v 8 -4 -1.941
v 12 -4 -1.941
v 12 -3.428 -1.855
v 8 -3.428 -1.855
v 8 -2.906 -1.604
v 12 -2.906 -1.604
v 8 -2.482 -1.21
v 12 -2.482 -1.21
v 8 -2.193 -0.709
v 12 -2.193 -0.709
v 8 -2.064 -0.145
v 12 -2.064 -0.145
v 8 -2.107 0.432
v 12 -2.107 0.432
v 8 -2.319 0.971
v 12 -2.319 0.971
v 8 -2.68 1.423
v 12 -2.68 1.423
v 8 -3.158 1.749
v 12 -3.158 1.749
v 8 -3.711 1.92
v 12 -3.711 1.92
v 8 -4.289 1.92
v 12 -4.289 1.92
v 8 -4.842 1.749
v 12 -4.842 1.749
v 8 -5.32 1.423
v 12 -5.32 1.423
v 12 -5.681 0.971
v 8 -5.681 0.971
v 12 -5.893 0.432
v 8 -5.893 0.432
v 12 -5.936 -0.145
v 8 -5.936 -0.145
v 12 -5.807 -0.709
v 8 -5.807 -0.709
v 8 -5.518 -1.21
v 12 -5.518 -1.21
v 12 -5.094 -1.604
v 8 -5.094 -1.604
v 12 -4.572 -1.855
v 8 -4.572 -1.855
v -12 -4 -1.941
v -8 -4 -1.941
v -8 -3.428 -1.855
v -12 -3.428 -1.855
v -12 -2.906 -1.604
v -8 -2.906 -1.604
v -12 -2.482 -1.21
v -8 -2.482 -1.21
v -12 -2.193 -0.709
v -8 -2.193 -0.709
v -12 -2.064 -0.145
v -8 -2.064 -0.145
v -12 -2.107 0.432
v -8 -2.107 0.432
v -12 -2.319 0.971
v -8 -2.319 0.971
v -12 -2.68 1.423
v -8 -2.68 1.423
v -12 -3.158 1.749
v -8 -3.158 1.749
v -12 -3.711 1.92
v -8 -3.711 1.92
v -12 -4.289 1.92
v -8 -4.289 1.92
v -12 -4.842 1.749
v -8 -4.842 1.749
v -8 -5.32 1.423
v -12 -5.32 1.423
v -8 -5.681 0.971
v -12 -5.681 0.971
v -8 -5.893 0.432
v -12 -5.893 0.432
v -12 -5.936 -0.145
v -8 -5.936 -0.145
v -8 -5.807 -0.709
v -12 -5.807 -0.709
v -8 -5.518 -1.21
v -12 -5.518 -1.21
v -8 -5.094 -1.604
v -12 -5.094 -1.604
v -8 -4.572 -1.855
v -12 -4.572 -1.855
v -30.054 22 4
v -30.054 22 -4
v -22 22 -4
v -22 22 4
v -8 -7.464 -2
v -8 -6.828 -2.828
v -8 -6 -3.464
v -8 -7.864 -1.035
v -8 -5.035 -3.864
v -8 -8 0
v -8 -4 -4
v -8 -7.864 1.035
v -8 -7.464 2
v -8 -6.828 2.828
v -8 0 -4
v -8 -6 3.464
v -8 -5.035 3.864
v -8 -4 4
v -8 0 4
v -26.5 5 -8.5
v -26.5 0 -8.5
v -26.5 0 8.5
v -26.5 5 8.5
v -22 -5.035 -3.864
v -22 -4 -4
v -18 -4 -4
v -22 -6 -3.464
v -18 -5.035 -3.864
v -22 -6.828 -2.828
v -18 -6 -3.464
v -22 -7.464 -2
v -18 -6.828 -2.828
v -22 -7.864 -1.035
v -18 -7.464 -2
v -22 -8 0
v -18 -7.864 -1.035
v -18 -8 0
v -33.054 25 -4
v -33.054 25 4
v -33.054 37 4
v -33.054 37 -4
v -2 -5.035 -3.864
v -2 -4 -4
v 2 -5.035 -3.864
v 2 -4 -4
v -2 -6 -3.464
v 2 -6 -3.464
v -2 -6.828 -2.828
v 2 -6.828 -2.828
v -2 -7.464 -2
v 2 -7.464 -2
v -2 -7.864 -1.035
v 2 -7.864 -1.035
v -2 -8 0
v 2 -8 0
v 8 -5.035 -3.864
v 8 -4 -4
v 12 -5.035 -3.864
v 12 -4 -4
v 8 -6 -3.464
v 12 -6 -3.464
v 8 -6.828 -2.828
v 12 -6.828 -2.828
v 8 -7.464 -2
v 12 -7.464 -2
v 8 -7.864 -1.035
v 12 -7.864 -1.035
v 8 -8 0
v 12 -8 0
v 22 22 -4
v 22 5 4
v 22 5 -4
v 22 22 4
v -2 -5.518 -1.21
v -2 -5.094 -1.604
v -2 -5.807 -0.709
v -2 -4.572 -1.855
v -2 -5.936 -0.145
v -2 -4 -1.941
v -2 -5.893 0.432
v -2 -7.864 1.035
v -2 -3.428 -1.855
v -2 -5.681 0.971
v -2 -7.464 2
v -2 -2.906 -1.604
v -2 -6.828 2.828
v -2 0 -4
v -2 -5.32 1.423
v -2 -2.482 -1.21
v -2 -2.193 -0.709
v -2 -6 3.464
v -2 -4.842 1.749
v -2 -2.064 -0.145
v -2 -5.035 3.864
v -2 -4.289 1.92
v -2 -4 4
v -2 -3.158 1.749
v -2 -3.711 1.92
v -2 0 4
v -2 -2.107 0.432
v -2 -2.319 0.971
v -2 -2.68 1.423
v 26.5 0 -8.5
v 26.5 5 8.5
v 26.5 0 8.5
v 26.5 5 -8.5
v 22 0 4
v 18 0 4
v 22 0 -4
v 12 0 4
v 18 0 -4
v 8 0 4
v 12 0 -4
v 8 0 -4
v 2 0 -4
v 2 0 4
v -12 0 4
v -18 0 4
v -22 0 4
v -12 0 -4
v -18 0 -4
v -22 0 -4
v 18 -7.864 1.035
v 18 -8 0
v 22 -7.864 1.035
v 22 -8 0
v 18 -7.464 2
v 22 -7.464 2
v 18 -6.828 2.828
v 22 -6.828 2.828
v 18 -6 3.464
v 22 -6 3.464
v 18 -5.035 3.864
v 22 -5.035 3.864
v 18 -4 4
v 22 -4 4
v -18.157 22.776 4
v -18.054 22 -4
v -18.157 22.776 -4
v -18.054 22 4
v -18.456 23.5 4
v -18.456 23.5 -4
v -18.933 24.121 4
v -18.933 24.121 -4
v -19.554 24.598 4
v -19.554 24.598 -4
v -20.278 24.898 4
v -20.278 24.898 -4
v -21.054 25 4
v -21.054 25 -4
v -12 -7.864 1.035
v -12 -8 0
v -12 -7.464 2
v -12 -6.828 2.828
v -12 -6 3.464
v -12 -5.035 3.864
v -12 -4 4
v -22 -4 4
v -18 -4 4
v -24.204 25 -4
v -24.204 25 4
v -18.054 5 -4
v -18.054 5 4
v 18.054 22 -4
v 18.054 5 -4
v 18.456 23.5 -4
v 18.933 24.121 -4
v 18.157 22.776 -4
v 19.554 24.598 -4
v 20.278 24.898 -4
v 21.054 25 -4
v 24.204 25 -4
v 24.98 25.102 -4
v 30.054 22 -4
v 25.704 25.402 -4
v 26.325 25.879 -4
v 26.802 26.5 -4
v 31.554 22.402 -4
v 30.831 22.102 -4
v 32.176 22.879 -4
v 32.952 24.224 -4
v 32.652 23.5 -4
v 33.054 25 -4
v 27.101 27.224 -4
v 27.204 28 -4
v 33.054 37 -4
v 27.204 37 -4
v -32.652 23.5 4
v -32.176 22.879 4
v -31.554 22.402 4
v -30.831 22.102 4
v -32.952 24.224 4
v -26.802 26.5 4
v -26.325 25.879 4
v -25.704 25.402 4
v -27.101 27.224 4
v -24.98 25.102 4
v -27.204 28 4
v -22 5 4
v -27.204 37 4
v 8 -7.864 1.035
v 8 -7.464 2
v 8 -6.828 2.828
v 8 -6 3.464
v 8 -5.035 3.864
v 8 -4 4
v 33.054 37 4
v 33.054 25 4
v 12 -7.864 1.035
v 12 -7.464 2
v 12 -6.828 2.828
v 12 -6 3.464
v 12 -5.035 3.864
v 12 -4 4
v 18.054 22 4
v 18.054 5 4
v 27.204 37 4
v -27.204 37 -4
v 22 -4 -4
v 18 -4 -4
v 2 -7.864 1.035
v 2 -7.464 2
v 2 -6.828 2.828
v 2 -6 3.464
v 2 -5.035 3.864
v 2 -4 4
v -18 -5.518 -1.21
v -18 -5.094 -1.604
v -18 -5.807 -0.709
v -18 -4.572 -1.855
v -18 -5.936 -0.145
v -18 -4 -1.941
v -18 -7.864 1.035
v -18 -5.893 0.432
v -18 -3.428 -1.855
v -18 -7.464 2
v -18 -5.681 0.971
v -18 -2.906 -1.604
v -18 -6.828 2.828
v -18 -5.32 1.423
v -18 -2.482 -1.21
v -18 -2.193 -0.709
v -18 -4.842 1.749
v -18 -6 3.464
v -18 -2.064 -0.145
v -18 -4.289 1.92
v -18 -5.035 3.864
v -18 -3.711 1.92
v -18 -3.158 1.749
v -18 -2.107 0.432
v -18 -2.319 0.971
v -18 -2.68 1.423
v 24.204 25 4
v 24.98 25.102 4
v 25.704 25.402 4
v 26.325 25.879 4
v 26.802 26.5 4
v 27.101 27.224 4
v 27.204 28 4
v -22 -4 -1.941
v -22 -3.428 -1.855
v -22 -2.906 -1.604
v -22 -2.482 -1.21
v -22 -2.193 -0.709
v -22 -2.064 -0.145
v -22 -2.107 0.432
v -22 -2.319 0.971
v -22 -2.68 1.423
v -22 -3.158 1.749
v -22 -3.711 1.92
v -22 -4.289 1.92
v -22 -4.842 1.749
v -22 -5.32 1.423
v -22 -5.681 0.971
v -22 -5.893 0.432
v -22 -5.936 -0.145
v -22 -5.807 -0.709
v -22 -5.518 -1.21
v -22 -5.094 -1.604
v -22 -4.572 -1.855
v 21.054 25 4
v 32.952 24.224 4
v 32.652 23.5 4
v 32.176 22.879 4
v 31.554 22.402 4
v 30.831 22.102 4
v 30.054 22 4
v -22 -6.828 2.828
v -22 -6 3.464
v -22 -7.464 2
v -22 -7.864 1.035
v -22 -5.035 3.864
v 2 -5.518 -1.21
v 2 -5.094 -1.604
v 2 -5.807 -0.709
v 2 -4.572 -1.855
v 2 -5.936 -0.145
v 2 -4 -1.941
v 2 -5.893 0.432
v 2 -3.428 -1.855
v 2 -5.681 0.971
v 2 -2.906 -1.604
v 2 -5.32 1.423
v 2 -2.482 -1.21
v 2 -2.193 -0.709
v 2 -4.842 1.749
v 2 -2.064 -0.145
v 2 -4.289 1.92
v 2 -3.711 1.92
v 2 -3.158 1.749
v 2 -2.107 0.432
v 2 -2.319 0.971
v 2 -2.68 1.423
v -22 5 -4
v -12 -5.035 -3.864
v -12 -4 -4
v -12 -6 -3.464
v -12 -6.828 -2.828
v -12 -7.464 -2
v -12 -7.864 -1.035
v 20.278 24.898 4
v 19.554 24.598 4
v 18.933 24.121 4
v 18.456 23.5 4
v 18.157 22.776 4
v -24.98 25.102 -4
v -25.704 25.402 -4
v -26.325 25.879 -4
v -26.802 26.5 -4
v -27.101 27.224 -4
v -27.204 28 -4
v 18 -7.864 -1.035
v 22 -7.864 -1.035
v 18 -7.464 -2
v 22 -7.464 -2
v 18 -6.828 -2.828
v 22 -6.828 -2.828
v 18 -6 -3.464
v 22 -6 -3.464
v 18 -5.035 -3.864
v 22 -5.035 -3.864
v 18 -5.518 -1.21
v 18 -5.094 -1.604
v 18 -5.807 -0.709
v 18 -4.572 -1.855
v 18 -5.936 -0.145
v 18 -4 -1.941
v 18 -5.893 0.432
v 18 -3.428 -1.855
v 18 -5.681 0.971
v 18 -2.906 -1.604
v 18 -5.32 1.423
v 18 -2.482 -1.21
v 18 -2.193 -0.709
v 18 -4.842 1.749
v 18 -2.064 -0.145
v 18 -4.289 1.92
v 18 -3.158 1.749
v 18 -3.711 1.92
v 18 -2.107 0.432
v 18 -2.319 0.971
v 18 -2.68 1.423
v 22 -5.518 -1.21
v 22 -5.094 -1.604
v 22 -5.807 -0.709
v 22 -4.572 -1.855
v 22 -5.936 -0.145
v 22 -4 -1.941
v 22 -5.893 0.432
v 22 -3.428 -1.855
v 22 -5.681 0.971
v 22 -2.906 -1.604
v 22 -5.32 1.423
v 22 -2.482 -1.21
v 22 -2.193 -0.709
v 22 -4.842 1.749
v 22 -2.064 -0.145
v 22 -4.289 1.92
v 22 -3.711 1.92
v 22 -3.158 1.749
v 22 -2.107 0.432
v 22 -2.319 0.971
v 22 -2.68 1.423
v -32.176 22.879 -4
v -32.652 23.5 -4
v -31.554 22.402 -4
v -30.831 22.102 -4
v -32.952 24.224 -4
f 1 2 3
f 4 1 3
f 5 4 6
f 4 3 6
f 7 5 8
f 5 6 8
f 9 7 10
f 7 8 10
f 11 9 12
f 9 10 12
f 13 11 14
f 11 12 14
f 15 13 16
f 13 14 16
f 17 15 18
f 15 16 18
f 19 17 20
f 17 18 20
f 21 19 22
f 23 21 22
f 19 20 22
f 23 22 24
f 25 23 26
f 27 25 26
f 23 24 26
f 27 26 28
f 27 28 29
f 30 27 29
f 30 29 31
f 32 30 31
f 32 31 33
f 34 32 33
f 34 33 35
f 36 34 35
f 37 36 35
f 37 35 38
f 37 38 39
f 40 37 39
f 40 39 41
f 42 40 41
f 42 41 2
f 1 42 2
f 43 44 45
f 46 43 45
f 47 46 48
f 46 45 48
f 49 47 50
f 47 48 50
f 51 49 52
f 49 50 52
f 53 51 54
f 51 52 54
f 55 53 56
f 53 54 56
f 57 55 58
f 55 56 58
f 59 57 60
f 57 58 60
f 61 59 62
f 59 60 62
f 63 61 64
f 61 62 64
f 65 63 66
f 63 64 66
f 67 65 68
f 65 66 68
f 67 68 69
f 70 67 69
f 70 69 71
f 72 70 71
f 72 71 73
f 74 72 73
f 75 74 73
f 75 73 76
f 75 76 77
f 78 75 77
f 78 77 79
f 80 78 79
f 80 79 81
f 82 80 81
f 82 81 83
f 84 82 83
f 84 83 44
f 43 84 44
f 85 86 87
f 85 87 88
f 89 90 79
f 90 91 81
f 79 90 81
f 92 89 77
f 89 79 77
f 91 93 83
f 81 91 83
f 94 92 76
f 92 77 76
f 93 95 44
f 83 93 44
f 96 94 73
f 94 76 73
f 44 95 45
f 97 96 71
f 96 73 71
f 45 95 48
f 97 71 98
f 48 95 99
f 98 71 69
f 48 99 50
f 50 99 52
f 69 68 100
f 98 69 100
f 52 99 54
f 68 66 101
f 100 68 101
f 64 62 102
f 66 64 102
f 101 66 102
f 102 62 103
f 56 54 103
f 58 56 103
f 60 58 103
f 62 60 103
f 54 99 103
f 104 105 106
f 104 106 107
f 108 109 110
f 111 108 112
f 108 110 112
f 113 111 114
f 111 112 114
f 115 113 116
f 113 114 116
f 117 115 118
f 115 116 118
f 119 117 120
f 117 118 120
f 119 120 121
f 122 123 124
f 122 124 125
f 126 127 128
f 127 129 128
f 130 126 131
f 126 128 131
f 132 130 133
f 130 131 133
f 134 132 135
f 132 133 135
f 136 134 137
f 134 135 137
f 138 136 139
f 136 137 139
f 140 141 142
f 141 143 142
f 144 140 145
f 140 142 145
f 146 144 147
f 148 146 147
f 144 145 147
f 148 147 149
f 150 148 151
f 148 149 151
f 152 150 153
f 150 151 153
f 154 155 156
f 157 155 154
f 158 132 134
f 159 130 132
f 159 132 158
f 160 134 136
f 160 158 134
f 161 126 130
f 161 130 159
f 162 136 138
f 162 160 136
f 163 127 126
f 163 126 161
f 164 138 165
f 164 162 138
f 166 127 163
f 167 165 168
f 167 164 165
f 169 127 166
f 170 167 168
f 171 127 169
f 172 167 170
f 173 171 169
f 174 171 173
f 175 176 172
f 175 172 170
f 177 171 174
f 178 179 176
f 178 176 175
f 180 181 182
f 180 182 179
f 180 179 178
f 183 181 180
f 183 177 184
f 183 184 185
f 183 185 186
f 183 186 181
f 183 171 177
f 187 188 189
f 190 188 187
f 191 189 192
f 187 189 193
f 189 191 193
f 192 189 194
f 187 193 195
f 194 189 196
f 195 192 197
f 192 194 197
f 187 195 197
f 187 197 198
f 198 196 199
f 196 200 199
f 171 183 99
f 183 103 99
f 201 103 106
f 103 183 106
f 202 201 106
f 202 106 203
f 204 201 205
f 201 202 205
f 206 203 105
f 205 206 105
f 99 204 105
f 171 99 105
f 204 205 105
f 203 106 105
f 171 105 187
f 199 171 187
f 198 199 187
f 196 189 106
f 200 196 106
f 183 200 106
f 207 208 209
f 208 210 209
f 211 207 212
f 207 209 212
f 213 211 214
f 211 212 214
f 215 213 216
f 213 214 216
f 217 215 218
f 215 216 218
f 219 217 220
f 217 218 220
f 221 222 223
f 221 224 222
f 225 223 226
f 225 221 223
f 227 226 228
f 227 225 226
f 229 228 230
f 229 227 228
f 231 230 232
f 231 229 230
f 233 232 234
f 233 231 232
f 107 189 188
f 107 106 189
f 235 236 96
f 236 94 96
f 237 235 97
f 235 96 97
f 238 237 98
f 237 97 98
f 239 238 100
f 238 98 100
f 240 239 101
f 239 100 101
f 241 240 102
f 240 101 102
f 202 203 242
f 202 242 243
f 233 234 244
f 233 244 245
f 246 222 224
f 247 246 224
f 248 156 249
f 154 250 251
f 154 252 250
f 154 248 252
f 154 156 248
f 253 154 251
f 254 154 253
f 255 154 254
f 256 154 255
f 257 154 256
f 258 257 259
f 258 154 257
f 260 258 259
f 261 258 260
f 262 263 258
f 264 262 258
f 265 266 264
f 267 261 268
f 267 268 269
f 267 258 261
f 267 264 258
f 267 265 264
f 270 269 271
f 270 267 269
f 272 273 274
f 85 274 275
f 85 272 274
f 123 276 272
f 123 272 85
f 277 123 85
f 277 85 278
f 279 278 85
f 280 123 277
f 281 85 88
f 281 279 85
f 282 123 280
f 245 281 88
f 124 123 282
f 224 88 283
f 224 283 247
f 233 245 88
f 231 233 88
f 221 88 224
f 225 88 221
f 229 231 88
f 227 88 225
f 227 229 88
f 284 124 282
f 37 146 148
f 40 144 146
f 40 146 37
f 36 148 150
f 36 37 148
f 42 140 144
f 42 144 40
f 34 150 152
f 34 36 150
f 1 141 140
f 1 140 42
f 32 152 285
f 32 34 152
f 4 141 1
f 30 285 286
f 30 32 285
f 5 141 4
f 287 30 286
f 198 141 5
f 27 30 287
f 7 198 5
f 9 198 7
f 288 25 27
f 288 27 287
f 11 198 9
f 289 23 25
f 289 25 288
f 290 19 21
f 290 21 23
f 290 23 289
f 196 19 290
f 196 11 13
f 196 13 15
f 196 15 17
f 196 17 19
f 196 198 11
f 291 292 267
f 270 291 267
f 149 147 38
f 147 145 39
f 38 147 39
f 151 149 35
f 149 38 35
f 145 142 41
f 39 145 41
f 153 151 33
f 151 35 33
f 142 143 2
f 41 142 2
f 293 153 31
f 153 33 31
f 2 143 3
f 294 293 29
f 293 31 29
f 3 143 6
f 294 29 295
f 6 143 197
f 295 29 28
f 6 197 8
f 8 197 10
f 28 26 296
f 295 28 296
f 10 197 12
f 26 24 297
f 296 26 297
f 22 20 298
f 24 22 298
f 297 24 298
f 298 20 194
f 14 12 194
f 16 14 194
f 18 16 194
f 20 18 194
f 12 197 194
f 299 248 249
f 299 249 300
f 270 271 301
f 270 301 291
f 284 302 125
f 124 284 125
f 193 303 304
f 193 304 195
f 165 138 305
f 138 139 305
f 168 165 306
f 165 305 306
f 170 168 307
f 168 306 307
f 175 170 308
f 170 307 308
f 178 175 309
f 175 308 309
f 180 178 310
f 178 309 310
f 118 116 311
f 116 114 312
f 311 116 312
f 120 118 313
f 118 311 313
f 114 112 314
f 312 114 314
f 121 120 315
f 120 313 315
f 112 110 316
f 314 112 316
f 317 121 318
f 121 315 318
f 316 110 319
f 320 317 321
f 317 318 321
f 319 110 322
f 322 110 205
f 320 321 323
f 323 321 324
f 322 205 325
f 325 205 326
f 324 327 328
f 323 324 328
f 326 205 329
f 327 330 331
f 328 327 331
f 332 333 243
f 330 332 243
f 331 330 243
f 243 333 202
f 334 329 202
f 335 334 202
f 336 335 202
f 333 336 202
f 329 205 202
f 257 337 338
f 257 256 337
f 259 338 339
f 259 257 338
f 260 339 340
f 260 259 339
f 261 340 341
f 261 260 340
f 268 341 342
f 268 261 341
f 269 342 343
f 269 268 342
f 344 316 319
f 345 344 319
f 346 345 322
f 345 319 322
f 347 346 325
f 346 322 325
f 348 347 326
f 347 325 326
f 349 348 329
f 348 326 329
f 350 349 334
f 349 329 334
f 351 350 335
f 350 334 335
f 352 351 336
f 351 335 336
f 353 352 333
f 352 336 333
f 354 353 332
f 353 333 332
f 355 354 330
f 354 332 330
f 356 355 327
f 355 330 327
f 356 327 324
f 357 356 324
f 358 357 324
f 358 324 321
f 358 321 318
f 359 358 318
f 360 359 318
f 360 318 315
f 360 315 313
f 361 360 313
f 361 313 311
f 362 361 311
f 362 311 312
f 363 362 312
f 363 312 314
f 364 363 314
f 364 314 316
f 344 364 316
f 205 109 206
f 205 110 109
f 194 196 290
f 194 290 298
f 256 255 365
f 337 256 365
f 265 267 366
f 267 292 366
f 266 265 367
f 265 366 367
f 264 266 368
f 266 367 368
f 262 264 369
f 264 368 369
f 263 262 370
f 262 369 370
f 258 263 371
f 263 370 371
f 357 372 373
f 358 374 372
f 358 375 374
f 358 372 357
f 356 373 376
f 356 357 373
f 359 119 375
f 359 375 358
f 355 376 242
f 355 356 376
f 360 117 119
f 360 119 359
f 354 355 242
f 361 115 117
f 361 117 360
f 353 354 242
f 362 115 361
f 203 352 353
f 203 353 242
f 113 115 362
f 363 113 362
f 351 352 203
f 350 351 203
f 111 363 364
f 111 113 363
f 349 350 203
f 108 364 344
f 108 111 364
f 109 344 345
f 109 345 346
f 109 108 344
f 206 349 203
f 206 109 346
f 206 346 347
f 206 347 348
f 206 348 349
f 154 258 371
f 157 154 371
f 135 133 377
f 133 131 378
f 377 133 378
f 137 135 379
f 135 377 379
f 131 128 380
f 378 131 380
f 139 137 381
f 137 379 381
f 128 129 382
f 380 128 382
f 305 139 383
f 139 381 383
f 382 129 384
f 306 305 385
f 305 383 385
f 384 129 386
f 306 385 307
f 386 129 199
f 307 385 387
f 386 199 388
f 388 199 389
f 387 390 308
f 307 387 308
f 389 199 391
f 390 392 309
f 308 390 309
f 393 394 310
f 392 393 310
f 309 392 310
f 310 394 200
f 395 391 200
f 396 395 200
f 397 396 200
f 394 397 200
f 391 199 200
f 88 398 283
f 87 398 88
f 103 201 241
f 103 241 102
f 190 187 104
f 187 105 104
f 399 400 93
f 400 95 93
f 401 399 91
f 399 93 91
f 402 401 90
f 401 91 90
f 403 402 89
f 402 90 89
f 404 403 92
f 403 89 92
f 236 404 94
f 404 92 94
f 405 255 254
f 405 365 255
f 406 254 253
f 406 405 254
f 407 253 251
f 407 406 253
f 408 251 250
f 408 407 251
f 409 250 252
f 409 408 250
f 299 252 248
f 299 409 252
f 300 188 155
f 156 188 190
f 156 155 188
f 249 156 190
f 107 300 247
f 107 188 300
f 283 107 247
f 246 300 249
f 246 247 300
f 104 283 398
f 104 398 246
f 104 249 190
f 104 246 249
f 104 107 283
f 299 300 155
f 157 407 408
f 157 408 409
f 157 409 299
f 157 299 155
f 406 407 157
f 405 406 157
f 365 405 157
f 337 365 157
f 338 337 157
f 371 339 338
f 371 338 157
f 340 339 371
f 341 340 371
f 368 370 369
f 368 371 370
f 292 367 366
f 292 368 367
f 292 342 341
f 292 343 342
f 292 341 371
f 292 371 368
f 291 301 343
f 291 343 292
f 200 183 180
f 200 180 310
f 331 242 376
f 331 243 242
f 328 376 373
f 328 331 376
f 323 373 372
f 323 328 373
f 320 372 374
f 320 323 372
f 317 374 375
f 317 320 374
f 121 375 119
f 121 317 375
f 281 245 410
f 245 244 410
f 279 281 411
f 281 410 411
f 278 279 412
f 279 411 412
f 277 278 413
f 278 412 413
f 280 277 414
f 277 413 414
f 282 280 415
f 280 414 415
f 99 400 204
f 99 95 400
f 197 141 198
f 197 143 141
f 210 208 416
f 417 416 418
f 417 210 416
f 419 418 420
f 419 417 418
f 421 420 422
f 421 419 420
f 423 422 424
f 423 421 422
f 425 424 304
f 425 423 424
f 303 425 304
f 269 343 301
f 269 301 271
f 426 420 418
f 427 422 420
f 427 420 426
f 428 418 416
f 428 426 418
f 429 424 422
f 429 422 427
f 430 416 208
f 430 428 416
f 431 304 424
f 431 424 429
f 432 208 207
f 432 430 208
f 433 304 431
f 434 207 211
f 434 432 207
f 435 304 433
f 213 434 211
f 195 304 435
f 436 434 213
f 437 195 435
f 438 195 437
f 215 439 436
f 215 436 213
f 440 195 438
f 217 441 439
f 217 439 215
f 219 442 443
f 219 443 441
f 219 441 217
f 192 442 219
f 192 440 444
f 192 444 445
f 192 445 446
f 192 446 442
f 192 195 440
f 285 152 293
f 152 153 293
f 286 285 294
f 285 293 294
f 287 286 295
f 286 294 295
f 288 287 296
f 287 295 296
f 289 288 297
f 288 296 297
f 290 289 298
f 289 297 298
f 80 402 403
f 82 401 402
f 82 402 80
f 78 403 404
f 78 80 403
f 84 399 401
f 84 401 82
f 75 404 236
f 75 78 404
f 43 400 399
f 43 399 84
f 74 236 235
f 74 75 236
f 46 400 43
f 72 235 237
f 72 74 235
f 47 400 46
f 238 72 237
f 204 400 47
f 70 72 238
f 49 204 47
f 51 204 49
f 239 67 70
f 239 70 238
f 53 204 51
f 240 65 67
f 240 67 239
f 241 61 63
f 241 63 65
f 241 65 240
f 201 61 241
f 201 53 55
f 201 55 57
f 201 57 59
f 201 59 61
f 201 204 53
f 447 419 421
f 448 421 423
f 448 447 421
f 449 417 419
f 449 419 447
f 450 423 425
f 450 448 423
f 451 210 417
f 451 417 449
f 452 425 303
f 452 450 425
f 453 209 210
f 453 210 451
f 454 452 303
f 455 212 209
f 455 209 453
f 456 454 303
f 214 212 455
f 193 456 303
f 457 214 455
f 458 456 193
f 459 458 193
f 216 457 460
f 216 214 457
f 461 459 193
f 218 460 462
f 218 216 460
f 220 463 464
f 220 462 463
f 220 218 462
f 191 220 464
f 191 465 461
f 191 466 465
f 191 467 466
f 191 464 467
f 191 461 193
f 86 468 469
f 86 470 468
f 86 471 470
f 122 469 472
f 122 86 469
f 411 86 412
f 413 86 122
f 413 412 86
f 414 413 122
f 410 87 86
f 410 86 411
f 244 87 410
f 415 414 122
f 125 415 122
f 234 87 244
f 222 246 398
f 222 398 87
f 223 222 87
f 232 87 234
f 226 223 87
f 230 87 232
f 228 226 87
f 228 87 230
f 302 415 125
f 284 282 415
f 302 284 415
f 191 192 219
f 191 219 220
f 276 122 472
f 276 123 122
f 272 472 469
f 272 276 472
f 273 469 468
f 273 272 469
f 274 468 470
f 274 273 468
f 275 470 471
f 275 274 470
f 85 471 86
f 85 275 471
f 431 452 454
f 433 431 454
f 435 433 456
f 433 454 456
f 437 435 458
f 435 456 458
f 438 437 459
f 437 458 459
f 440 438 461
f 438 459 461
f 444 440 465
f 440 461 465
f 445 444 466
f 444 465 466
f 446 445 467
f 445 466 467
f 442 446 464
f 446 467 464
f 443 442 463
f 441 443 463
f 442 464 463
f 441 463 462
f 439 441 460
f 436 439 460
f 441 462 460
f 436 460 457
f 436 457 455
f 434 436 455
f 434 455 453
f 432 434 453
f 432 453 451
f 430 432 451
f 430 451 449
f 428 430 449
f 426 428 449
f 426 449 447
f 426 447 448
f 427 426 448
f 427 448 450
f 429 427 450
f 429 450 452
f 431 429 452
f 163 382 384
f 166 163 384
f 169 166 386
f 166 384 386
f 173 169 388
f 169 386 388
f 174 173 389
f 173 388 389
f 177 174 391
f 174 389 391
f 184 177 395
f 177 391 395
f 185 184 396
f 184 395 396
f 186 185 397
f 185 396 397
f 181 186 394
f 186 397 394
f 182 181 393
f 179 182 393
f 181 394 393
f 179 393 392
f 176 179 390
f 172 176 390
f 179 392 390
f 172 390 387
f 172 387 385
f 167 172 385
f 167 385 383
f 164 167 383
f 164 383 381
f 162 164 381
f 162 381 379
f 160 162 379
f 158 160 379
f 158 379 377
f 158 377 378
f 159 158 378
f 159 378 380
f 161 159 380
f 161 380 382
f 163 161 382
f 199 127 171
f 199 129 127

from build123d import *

# Parameters (mm, degrees)
SKETCH1_W              = 44
SKETCH1_H              = 8
BOSS_EXTRUDE1_DEPTH    = 5
SKETCH2_W              = 3.945665761
SKETCH2_H              = 8
BOSS_EXTRUDE2_DEPTH    = 17
SKETCH3_W              = 8
SKETCH3_H              = 3
BOSS_EXTRUDE3_DEPTH    = 15
SKETCH4_W              = 5.850643969
SKETCH4_H              = 8
BOSS_EXTRUDE4_DEPTH    = 12
SKETCH5_W              = 4
SKETCH5_H              = 8
BOSS_EXTRUDE5_DEPTH    = 8
FILLET2_R              = 4
LPATTERN1_COUNT        = 5
LPATTERN1_PITCH        = 10
FILLET2_OF_LPATTERN1_R = 4
SKETCH6_R              = 1.941337646
CUT_EXTRUDE1_DEPTH     = 67.452838302
SKETCH7_W              = 44
SKETCH7_H              = 5
BOSS_EXTRUDE6_DEPTH    = 4.5
SKETCH8_W              = 12.5
SKETCH8_H              = 5
BOSS_EXTRUDE7_DEPTH    = 4.5
SKETCH9_W              = 48.5
SKETCH9_H              = 5
BOSS_EXTRUDE8_DEPTH    = 4.5
SKETCH10_W             = 17
SKETCH10_H             = 5
BOSS_EXTRUDE9_DEPTH    = 4.5
FILLET4_R              = 3


with BuildPart() as part:
    # Sketch1 → Boss-Extrude1 (new body)
    with BuildSketch(Plane(origin=(0, 0, 0), x_dir=(1, 0, 0), z_dir=(0, 1, 0))):
        Rectangle(SKETCH1_W, SKETCH1_H)
    extrude(amount=BOSS_EXTRUDE1_DEPTH)

    # Sketch2 → Boss-Extrude2 (add)
    with BuildSketch(Plane(origin=(0, 5, 0), x_dir=(1, 0, 0), z_dir=(0, 1, 0))):
        with Locations((20.027167119, 0)):
            Rectangle(SKETCH2_W, SKETCH2_H)
    boss_extrude2 = extrude(amount=BOSS_EXTRUDE2_DEPTH)

    # Sketch3 → Boss-Extrude3 (add)
    with BuildSketch(Plane.ZY.offset(-18.054334239)):
        with Locations((0, 23.5)):
            Rectangle(SKETCH3_W, SKETCH3_H)
    boss_extrude3 = extrude(amount=-BOSS_EXTRUDE3_DEPTH)

    # Sketch4 → Boss-Extrude4 (add)
    with BuildSketch(Plane(origin=(0, 25, 0), x_dir=(1, 0, 0), z_dir=(0, 1, 0))):
        with Locations((30.129012255, 0)):
            Rectangle(SKETCH4_W, SKETCH4_H)
    boss_extrude4 = extrude(amount=BOSS_EXTRUDE4_DEPTH)

    # Mirror1: Boss-Extrude2, Boss-Extrude3, Boss-Extrude4 across plane
    add(boss_extrude2.mirror(Plane(origin=(0, 0, 0), x_dir=(0, 0, 1), z_dir=(1, 0, 0))))
    add(boss_extrude3.mirror(Plane(origin=(0, 0, 0), x_dir=(0, 0, 1), z_dir=(1, 0, 0))))
    add(boss_extrude4.mirror(Plane(origin=(0, 0, 0), x_dir=(0, 0, 1), z_dir=(1, 0, 0))))

    # Sketch5 → Boss-Extrude5 (add)
    with BuildSketch(Plane.XZ):
        with Locations((20, 0)):
            Rectangle(SKETCH5_W, SKETCH5_H)
    boss_extrude5 = extrude(amount=BOSS_EXTRUDE5_DEPTH)

    # Fillet2
    fillet2_edges = [part.edges().sort_by_distance(p)[0] for p in [
        (20, -8, -4),
        (20, -8, 4),
    ]]
    fillet(fillet2_edges, radius=FILLET2_R - 0.0001)  # a hair under: the kernel refuses the full size

    # LPattern1: Boss-Extrude5 ×5
    with Locations(*[(-i * LPATTERN1_PITCH, 0, 0) for i in range(1, LPATTERN1_COUNT)]):
        add(boss_extrude5)

    # Fillet2 of LPattern1
    fillet2_of_lpattern1_edges = [part.edges().sort_by_distance(p)[0] for p in [
        (10, -8, -4),
        (10, -8, 4),
        (0, -8, -4),
        (0, -8, 4),
        (-10, -8, -4),
        (-10, -8, 4),
        (-20, -8, -4),
        (-20, -8, 4),
    ]]
    fillet(fillet2_of_lpattern1_edges, radius=FILLET2_OF_LPATTERN1_R - 0.0001)  # a hair under: the kernel refuses the full size

    # Sketch6 → Cut-Extrude1 (cut, through all)
    with BuildSketch(Plane(origin=(22, 0, 0), x_dir=(0, 0, -1), z_dir=(1, 0, 0))):
        with Locations((0, -4)):
            Circle(SKETCH6_R)
    extrude(amount=-CUT_EXTRUDE1_DEPTH, mode=Mode.SUBTRACT)

    # Sketch7 → Boss-Extrude6 (add)
    with BuildSketch(Plane.XY.offset(4)):
        with Locations((0, 2.5)):
            Rectangle(SKETCH7_W, SKETCH7_H)
    extrude(amount=BOSS_EXTRUDE6_DEPTH)

    # Sketch8 → Boss-Extrude7 (add)
    with BuildSketch(Plane.ZY.offset(22)):
        with Locations((2.25, 2.5)):
            Rectangle(SKETCH8_W, SKETCH8_H)
    extrude(amount=BOSS_EXTRUDE7_DEPTH)

    # Sketch9 → Boss-Extrude8 (add)
    with BuildSketch(Plane(origin=(0, 0, -4), x_dir=(-1, 0, 0), z_dir=(0, 0, -1))):
        with Locations((2.25, 2.5)):
            Rectangle(SKETCH9_W, SKETCH9_H)
    extrude(amount=BOSS_EXTRUDE8_DEPTH)

    # Sketch10 → Boss-Extrude9 (add)
    with BuildSketch(Plane(origin=(22, 0, 0), x_dir=(0, 0, -1), z_dir=(1, 0, 0))):
        with Locations((0, 2.5)):
            Rectangle(SKETCH10_W, SKETCH10_H)
    extrude(amount=BOSS_EXTRUDE9_DEPTH)

    # Fillet4
    fillet4_edges = [part.edges().sort_by_distance(p)[0] for p in [
        (33.054334239, 22, 0),
        (18.054334239, 25, 0),
        (27.20369027, 25, 0),
        (-18.054334239, 25, 0),
        (-33.054334239, 22, 0),
        (-27.20369027, 25, 0),
    ]]
    fillet(fillet4_edges, radius=FILLET4_R)


solid = part.part
